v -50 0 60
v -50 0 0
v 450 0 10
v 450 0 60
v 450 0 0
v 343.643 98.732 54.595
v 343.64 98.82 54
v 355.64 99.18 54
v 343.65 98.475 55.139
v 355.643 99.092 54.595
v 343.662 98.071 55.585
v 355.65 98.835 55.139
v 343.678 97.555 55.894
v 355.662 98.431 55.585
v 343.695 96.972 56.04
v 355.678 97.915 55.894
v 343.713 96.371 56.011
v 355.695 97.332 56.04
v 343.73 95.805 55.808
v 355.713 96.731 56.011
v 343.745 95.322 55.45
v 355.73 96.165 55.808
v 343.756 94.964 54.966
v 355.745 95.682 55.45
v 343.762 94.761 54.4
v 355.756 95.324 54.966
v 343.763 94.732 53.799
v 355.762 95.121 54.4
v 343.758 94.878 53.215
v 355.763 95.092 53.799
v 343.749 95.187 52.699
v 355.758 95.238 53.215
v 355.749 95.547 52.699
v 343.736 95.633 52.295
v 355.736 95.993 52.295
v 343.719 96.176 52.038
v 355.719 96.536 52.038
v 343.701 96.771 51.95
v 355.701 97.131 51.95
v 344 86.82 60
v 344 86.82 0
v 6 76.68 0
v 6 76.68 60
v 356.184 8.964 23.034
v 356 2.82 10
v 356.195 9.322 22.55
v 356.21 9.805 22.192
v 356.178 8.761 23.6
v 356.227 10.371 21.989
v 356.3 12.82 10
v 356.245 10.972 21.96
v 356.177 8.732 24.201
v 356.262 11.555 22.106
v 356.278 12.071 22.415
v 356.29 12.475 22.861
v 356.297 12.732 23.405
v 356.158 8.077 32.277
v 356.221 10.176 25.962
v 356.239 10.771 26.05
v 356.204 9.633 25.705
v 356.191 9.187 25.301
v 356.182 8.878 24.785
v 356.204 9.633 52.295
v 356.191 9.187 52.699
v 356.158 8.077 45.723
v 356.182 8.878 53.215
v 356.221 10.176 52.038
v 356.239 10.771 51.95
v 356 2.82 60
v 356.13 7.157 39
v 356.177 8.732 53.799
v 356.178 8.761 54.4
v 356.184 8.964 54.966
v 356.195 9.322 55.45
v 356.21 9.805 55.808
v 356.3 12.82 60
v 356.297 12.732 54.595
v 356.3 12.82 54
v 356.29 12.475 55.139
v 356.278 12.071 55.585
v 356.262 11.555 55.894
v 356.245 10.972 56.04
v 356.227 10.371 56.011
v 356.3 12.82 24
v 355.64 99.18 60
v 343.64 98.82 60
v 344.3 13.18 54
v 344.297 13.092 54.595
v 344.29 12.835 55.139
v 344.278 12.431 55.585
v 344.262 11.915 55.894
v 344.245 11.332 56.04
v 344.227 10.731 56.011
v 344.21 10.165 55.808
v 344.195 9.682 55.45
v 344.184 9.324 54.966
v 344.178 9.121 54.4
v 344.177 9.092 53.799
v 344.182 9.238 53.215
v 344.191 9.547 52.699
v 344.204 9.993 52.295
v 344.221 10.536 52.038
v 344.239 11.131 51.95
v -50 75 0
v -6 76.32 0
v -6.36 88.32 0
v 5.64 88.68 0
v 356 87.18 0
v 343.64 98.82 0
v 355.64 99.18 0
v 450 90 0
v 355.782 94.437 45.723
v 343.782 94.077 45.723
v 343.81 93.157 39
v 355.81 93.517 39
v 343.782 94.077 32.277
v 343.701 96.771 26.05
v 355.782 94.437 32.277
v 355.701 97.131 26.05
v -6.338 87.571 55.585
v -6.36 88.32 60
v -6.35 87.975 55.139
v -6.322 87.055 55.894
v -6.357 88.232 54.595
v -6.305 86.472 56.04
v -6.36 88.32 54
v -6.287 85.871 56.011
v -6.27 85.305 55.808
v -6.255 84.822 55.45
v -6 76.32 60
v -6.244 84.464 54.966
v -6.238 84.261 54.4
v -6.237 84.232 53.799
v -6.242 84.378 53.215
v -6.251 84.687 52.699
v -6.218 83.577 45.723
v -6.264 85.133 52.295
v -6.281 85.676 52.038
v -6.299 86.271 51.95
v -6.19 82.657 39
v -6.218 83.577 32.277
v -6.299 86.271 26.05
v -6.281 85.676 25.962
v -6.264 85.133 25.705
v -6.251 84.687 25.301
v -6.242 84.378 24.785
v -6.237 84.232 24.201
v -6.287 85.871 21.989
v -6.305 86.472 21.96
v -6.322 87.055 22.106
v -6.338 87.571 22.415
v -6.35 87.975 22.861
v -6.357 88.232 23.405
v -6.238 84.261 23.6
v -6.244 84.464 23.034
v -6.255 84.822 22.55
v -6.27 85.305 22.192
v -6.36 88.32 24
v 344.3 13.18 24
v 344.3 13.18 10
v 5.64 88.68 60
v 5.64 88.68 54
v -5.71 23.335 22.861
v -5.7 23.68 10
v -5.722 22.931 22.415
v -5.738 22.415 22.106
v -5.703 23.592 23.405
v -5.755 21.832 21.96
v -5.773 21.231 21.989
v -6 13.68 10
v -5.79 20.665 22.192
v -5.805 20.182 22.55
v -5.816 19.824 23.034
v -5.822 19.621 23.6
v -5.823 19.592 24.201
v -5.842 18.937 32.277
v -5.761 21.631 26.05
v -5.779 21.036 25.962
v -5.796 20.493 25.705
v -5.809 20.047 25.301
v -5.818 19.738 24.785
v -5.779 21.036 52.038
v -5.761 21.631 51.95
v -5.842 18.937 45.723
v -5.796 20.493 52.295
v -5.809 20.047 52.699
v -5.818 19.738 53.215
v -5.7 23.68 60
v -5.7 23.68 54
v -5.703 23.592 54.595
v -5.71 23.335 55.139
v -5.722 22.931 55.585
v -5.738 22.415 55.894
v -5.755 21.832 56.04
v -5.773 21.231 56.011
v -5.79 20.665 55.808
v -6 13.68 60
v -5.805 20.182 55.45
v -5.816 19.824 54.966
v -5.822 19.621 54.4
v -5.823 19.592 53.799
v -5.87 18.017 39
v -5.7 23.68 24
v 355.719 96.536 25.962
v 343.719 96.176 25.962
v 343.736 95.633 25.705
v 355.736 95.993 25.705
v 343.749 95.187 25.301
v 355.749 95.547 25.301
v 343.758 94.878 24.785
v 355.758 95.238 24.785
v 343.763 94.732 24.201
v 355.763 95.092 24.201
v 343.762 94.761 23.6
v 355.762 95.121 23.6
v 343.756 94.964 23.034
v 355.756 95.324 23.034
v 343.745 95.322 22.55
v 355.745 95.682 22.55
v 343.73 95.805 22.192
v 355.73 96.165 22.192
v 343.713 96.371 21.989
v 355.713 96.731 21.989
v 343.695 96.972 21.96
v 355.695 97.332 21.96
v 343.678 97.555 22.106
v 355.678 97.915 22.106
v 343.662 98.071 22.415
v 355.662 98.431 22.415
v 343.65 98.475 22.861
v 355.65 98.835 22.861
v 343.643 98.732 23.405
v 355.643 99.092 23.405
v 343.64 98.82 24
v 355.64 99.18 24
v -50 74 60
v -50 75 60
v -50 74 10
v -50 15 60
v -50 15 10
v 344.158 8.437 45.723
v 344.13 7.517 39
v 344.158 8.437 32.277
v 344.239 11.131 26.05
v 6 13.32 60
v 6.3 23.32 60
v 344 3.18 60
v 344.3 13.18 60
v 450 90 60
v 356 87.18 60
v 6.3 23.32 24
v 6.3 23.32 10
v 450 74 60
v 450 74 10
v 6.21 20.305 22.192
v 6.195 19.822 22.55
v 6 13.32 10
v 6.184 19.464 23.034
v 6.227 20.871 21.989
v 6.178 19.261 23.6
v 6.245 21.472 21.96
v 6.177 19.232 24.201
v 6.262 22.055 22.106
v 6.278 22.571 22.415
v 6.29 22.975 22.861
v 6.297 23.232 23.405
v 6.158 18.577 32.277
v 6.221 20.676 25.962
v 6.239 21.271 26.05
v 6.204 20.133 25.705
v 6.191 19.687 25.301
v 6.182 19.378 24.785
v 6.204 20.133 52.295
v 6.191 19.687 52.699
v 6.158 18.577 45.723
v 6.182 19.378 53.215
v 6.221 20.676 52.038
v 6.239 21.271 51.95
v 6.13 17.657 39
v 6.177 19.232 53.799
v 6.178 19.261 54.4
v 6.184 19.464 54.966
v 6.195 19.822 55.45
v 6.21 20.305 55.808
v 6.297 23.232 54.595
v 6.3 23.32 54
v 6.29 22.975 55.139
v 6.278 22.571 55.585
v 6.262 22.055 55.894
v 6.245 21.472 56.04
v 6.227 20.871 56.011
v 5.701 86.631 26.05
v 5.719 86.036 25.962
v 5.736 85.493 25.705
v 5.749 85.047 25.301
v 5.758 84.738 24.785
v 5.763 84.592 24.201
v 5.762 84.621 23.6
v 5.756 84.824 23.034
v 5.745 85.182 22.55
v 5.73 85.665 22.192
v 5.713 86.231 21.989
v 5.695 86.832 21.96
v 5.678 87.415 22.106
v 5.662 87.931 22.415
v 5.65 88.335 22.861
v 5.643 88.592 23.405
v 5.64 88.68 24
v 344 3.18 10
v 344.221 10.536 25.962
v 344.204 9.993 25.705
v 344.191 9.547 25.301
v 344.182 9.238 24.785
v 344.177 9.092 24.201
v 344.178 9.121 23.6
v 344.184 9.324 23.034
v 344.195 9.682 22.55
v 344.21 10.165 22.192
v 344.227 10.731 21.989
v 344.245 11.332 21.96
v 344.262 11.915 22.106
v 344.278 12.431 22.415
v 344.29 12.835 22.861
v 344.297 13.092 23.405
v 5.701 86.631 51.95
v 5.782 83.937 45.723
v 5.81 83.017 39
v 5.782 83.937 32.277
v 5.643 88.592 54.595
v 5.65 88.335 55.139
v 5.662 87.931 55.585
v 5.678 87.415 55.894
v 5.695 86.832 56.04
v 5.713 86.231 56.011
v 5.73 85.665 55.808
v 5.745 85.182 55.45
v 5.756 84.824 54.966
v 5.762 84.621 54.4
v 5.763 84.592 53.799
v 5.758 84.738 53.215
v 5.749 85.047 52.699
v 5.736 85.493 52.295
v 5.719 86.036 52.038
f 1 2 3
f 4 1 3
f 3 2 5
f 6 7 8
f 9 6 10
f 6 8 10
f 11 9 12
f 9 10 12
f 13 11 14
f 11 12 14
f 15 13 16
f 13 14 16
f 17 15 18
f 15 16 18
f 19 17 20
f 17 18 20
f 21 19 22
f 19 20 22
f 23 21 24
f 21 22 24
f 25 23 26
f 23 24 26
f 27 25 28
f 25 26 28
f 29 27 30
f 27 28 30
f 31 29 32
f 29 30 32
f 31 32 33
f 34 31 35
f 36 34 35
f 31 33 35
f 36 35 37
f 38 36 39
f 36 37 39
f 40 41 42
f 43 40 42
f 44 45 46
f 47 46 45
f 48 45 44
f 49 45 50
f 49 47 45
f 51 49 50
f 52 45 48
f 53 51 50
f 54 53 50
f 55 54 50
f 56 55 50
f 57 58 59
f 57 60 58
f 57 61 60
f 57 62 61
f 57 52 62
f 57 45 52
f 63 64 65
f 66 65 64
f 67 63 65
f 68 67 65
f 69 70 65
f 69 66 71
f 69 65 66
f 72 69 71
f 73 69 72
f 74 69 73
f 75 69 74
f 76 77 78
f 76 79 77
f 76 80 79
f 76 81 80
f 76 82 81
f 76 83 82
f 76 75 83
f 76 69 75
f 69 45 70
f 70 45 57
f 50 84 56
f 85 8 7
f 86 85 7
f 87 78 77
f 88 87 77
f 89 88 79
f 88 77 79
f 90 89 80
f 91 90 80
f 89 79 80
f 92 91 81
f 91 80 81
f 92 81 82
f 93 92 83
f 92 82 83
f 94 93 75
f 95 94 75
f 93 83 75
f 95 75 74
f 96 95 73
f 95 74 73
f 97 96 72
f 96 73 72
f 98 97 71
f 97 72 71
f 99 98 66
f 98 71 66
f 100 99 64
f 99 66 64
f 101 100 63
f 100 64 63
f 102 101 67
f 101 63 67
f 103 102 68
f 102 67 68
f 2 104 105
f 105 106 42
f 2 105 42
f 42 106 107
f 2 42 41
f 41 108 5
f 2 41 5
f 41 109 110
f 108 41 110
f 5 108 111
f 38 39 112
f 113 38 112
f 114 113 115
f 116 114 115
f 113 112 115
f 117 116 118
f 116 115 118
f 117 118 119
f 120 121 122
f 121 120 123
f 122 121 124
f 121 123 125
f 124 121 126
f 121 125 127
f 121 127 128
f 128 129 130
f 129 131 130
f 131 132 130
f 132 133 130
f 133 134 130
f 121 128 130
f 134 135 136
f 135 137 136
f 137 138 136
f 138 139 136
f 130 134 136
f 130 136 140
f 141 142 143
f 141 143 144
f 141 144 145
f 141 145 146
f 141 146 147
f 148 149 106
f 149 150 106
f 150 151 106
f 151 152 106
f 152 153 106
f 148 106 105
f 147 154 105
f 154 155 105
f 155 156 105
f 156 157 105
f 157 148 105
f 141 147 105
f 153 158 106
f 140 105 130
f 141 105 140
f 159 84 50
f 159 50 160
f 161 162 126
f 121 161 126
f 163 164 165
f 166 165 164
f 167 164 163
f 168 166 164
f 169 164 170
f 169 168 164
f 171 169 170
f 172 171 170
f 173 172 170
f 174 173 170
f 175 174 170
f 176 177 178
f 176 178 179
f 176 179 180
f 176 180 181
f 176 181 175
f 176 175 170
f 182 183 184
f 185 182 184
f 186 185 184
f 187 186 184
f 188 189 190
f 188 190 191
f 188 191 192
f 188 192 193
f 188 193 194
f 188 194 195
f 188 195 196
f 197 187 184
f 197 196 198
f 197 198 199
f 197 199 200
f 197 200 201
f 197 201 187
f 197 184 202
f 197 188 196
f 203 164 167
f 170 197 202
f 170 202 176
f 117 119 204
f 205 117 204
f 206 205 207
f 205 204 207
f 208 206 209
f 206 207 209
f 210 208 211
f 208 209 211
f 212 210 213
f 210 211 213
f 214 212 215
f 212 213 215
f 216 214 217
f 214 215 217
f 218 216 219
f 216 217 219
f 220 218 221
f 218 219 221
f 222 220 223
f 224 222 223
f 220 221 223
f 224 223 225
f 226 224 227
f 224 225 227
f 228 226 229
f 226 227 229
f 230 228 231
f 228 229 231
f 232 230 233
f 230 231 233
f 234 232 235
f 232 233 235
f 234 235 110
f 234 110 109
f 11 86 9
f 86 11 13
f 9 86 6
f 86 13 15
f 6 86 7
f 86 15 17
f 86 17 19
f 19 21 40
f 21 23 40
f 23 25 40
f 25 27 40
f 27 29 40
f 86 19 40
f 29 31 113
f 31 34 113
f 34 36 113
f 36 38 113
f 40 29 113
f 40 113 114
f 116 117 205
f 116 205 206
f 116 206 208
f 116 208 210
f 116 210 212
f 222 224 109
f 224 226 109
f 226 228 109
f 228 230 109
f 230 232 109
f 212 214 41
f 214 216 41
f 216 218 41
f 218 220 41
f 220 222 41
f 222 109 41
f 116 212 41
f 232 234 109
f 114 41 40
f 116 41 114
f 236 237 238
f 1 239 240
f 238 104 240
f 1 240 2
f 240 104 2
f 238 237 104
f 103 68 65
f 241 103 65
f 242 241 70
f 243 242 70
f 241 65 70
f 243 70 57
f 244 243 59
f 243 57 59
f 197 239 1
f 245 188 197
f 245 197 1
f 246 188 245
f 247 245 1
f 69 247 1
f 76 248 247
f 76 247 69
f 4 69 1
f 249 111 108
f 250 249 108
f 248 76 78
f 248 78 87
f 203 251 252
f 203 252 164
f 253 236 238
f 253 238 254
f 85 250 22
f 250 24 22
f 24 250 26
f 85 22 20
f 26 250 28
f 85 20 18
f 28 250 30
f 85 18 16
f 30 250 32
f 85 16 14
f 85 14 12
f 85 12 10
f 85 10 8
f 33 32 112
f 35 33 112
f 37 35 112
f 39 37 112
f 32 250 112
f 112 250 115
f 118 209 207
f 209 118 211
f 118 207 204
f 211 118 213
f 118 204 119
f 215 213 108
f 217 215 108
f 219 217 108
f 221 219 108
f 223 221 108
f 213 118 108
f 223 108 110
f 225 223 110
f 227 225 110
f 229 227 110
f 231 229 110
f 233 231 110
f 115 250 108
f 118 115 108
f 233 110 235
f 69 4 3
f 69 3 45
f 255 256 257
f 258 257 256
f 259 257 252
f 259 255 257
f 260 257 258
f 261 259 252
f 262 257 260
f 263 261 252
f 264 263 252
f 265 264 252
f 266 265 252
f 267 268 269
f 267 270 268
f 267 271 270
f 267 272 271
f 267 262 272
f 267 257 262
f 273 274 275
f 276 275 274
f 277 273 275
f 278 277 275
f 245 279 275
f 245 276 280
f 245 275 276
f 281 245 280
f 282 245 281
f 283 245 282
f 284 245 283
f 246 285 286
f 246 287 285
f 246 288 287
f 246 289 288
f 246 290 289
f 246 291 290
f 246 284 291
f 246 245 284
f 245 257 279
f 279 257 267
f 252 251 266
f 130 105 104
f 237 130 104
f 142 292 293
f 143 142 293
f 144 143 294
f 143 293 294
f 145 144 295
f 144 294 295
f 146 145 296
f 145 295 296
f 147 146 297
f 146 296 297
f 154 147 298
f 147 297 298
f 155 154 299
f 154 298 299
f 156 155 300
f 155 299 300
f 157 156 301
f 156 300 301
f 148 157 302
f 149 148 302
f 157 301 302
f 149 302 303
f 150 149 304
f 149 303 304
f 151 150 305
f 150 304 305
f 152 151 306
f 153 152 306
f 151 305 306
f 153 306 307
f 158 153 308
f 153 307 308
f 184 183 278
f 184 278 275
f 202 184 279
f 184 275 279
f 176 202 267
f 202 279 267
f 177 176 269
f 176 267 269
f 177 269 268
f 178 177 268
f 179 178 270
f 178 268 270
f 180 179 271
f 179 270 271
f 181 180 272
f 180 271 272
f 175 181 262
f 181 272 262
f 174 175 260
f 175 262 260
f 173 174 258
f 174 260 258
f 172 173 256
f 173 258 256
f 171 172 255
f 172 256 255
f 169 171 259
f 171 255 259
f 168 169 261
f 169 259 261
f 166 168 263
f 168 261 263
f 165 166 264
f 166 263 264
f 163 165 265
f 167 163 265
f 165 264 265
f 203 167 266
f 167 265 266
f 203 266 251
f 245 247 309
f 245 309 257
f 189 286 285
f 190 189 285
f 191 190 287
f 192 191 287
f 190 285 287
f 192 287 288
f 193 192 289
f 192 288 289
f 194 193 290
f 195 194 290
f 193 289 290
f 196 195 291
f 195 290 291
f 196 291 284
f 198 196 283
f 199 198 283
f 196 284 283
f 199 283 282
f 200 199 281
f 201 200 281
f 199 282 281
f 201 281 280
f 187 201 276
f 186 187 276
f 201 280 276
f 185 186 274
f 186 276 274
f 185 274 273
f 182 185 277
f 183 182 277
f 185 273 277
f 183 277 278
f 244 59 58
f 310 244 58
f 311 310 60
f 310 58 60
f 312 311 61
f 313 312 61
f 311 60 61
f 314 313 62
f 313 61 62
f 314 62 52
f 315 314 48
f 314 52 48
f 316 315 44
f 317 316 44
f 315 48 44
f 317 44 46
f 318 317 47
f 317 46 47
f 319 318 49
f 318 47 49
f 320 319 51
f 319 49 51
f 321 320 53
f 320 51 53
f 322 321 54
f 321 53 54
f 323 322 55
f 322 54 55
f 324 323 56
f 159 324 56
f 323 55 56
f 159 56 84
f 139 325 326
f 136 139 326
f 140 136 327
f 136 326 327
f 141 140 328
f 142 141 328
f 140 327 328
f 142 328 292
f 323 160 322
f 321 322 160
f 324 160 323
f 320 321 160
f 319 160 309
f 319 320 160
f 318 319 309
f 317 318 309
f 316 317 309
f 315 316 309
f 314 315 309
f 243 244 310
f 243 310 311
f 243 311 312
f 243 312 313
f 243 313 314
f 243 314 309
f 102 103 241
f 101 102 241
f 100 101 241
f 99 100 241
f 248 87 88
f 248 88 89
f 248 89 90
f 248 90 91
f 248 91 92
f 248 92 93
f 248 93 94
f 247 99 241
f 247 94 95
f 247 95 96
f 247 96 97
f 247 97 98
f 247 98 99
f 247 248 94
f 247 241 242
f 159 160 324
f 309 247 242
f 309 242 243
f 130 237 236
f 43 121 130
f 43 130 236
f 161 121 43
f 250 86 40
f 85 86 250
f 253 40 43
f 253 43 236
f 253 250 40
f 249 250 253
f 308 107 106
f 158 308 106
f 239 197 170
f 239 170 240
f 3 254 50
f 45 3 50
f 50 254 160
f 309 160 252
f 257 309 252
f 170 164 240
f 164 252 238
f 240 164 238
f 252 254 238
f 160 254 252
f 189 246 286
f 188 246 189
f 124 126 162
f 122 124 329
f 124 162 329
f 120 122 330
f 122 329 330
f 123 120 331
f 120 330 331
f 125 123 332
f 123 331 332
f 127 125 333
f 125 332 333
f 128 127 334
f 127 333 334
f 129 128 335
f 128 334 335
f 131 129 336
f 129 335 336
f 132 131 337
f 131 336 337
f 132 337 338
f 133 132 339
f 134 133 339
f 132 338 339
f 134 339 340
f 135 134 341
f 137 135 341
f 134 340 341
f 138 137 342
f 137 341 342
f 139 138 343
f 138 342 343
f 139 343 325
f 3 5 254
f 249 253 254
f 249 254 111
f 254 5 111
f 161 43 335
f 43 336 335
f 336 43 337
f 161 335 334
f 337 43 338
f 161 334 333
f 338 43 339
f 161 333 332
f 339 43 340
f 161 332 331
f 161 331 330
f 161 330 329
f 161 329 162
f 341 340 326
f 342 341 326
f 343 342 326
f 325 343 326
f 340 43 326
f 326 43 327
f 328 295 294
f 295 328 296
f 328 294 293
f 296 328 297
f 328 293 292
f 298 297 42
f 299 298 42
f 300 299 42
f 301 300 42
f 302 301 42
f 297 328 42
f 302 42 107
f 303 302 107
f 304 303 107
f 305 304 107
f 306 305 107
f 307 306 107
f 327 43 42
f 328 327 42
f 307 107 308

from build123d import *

# Parameters (mm, degrees)
PAD_DEPTH       = 60
POCKET_DEPTH    = 50
POCKET001_DEPTH = 408.7079232475
POCKET002_DEPTH = 408.4326470939


with BuildPart() as part:
    # Sketch → Pad (new body)
    with BuildSketch(Plane.XY):
        Polygon((450, 0), (450, 90), (356, 87.18), (355.64, 99.18), (343.64, 98.82), (344, 86.82), (6, 76.68), (5.64, 88.6800000001), (-6.36, 88.3200000001), (-6, 76.32), (-50, 75), (-50, 0), align=None)
    extrude(amount=PAD_DEPTH)

    # Sketch001 (on Face14 of Pad) → Pocket (cut)
    with BuildSketch(Plane.XY.offset(60)):
        Polygon((-50, 15), (-50, 74), (450, 74), (450, 0), (356, 2.82), (356.3, 12.82), (344.3, 13.18), (344, 3.18), (6, 13.32), (6.3, 23.32), (-5.7, 23.68), (-6, 13.68), align=None)
    extrude(amount=-POCKET_DEPTH, mode=Mode.SUBTRACT)

    # Sketch002 (on Face26 of Pocket) → Pocket001 (cut, through all)
    with BuildSketch(Plane(origin=(355.5953641722, -10.6678609252, 0), x_dir=(0.0299865091, 0.9995503035, 0), z_dir=(0.9995503035, -0.0299865091, 0))):
        with BuildLine():
            ThreePointArc((23.4984280855, 54), (19.9988591841, 55.4495689014), (21.4484280855, 51.95))
            ThreePointArc((21.4484280855, 51.95), (17.8329435114, 39), (21.4484280855, 26.05))
            ThreePointArc((21.4484280855, 26.05), (19.9988591841, 22.5504310986), (23.4984280855, 24))
            Line((23.4984280855, 24), (23.4984280855, 54))
        make_face()
    extrude(amount=-POCKET001_DEPTH, mode=Mode.SUBTRACT)

    # Sketch003 (on Face14 of Pocket001) → Pocket002 (cut, through all)
    with BuildSketch(Plane(origin=(358.2929363573, 10.7487880907, 0), x_dir=(-0.0299865091, 0.9995503035, 0), z_dir=(0.9995503035, 0.0299865091, 0))):
        with BuildLine():
            ThreePointArc((88.470997005, 54), (84.9714281036, 55.4495689014), (86.420997005, 51.95))
            ThreePointArc((86.420997005, 51.95), (82.8055124309, 39), (86.420997005, 26.05))
            ThreePointArc((86.420997005, 26.05), (84.9714281036, 22.5504310986), (88.470997005, 24))
            Line((88.470997005, 24), (88.470997005, 54))
        make_face()
    extrude(amount=-POCKET002_DEPTH, mode=Mode.SUBTRACT)


solid = part.part
